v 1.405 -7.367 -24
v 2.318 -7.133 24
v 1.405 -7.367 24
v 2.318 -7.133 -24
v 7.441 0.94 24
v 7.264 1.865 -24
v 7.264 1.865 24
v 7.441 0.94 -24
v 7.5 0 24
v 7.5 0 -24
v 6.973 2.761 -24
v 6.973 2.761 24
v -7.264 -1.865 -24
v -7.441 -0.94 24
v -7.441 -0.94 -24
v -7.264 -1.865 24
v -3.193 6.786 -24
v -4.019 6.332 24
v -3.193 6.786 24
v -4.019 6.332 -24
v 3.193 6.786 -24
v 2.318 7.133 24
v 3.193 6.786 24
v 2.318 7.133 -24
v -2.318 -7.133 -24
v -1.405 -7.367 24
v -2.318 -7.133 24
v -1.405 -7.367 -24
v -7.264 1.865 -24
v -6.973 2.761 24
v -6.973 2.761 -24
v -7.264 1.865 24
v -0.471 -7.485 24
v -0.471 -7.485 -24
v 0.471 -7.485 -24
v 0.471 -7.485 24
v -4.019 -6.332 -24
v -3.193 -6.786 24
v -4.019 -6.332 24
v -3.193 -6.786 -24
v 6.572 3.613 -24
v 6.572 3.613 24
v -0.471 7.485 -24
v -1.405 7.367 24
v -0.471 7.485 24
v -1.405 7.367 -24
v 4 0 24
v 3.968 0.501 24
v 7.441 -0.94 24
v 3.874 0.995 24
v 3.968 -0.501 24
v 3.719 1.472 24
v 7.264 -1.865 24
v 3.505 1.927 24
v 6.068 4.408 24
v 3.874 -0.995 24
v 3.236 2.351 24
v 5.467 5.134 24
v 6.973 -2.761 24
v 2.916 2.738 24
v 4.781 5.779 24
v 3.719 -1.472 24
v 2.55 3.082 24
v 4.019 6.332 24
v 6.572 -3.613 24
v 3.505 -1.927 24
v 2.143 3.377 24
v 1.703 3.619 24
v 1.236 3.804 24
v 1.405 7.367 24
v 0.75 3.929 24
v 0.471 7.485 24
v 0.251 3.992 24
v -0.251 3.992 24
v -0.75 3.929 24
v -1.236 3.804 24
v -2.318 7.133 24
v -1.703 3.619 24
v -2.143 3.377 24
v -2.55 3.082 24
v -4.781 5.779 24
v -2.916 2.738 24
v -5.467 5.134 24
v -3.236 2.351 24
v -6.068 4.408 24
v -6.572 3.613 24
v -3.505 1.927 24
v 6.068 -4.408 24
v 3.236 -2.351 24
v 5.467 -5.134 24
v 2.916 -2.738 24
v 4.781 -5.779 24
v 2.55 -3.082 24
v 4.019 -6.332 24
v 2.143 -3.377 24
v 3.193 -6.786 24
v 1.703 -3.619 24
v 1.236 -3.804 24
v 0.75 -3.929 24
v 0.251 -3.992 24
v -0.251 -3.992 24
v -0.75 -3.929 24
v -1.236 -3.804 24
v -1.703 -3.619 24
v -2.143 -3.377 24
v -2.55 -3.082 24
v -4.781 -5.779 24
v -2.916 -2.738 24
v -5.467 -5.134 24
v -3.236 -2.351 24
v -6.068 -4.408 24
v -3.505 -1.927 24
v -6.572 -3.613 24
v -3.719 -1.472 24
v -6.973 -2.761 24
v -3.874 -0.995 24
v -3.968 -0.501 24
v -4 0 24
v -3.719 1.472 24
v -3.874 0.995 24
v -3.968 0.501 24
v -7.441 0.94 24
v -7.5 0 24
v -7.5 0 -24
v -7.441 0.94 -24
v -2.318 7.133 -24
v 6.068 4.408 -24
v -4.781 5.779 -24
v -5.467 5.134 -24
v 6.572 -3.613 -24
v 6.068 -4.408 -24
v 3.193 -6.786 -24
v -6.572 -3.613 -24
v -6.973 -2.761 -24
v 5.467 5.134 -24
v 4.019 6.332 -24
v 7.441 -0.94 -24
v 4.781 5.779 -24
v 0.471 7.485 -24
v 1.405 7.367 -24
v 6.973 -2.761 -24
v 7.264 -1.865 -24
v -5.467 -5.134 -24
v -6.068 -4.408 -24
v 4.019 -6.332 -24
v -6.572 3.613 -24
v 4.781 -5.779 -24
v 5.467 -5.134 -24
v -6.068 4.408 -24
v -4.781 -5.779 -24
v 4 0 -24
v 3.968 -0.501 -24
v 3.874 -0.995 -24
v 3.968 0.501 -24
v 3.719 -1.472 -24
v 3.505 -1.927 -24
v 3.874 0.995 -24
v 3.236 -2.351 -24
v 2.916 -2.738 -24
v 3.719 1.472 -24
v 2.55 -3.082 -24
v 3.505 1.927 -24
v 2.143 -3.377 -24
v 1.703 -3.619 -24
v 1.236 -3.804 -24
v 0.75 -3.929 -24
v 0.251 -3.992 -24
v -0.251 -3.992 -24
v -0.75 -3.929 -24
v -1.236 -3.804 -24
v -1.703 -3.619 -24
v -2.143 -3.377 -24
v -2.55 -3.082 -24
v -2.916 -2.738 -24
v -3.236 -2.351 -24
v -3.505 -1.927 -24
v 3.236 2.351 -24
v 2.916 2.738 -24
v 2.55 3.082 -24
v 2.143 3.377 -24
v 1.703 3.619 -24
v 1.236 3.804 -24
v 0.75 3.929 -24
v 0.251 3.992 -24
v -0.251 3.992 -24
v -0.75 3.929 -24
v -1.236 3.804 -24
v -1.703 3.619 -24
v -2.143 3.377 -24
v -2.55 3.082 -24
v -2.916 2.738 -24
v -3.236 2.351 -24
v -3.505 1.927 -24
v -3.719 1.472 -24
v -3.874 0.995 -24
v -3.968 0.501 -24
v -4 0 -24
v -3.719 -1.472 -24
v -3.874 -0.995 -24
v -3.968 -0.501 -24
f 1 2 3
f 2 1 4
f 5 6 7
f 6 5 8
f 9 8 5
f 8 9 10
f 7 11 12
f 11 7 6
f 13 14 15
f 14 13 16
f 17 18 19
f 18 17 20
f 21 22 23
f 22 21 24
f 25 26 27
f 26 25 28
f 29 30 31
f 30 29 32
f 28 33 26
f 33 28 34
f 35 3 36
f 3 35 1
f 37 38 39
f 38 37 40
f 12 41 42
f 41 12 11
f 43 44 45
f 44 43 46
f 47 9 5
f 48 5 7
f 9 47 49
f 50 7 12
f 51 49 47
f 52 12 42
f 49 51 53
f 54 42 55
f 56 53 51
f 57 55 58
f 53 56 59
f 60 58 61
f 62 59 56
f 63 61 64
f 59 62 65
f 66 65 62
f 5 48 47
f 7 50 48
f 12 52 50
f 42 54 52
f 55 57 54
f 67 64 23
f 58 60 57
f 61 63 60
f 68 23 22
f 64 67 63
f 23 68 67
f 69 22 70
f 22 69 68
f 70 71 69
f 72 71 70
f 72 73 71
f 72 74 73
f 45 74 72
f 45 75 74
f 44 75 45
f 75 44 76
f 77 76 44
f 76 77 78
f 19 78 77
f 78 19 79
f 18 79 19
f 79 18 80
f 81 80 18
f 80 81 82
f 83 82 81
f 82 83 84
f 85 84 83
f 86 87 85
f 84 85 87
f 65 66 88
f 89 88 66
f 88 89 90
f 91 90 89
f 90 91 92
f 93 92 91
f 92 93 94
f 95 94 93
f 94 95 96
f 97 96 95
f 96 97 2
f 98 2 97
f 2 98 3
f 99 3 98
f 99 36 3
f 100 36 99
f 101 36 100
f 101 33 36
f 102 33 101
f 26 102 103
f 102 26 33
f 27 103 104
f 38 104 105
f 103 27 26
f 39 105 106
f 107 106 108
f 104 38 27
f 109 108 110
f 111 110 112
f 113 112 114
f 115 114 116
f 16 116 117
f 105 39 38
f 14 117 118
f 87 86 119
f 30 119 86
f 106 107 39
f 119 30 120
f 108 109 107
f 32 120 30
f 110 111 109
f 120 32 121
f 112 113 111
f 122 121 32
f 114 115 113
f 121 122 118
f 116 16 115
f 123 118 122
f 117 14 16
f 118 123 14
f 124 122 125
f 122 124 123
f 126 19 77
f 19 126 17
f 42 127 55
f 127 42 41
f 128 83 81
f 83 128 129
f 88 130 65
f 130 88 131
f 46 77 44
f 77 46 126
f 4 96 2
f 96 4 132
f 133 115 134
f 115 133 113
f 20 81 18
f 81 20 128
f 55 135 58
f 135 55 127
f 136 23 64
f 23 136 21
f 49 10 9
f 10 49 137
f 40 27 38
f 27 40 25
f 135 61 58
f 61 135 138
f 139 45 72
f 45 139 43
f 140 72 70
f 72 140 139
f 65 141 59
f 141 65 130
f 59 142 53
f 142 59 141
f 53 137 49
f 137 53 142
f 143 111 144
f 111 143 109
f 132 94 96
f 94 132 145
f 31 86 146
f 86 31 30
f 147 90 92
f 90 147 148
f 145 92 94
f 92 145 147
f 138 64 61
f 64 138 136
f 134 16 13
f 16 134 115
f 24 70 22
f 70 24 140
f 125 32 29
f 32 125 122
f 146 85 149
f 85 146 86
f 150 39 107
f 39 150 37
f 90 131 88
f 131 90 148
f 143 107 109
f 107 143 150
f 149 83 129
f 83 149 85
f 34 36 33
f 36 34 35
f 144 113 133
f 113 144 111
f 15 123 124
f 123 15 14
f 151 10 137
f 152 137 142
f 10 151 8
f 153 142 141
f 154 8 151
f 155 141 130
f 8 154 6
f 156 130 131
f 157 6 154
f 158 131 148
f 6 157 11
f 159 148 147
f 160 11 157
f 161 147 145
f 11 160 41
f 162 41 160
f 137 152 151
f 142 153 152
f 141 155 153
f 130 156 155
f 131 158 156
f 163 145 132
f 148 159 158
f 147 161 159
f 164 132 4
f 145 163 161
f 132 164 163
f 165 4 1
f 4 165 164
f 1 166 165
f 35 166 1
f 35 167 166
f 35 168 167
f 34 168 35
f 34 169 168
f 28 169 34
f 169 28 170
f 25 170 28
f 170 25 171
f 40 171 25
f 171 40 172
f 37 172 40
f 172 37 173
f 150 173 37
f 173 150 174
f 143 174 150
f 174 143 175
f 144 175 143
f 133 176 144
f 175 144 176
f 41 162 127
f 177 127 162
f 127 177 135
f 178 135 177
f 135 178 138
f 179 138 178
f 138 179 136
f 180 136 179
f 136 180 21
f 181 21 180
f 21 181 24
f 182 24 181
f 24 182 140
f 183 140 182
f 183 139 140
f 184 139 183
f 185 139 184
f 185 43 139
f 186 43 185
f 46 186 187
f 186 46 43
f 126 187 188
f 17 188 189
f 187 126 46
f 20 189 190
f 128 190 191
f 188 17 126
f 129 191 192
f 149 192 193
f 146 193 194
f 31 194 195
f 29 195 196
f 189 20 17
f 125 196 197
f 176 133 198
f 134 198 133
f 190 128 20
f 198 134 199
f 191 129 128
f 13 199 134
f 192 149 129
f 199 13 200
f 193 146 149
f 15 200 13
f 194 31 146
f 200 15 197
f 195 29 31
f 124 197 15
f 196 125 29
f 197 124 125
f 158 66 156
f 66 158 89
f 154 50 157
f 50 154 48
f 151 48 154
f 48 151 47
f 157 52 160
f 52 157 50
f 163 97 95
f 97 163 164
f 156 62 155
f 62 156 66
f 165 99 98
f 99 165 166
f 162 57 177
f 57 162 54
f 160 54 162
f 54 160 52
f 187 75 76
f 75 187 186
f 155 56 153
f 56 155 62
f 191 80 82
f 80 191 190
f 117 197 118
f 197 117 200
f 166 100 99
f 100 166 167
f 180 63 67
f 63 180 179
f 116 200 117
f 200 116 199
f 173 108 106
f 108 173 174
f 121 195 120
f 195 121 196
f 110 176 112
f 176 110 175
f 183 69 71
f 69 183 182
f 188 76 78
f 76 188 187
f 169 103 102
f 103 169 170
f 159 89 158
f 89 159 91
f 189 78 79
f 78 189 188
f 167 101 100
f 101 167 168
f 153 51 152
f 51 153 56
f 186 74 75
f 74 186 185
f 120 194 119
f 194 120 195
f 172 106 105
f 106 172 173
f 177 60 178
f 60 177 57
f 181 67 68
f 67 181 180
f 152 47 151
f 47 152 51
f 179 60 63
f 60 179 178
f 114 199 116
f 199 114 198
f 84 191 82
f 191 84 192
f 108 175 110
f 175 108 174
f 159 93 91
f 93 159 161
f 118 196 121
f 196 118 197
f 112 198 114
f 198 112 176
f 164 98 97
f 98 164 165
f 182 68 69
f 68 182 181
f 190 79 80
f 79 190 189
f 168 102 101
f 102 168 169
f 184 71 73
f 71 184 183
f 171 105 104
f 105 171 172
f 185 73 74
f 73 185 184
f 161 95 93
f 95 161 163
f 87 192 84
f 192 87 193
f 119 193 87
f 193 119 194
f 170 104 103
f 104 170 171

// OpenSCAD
$fn = 50;


difference() {
	union() {
		translate(v = [0, 0, -24.0000000000]) {
			cylinder(h = 48, r = 7.5000000000);
		}
	}
	union() {
		translate(v = [0, 0, -100.0000000000]) {
			cylinder(h = 200, r = 4.0000000000);
		}
	}
}
